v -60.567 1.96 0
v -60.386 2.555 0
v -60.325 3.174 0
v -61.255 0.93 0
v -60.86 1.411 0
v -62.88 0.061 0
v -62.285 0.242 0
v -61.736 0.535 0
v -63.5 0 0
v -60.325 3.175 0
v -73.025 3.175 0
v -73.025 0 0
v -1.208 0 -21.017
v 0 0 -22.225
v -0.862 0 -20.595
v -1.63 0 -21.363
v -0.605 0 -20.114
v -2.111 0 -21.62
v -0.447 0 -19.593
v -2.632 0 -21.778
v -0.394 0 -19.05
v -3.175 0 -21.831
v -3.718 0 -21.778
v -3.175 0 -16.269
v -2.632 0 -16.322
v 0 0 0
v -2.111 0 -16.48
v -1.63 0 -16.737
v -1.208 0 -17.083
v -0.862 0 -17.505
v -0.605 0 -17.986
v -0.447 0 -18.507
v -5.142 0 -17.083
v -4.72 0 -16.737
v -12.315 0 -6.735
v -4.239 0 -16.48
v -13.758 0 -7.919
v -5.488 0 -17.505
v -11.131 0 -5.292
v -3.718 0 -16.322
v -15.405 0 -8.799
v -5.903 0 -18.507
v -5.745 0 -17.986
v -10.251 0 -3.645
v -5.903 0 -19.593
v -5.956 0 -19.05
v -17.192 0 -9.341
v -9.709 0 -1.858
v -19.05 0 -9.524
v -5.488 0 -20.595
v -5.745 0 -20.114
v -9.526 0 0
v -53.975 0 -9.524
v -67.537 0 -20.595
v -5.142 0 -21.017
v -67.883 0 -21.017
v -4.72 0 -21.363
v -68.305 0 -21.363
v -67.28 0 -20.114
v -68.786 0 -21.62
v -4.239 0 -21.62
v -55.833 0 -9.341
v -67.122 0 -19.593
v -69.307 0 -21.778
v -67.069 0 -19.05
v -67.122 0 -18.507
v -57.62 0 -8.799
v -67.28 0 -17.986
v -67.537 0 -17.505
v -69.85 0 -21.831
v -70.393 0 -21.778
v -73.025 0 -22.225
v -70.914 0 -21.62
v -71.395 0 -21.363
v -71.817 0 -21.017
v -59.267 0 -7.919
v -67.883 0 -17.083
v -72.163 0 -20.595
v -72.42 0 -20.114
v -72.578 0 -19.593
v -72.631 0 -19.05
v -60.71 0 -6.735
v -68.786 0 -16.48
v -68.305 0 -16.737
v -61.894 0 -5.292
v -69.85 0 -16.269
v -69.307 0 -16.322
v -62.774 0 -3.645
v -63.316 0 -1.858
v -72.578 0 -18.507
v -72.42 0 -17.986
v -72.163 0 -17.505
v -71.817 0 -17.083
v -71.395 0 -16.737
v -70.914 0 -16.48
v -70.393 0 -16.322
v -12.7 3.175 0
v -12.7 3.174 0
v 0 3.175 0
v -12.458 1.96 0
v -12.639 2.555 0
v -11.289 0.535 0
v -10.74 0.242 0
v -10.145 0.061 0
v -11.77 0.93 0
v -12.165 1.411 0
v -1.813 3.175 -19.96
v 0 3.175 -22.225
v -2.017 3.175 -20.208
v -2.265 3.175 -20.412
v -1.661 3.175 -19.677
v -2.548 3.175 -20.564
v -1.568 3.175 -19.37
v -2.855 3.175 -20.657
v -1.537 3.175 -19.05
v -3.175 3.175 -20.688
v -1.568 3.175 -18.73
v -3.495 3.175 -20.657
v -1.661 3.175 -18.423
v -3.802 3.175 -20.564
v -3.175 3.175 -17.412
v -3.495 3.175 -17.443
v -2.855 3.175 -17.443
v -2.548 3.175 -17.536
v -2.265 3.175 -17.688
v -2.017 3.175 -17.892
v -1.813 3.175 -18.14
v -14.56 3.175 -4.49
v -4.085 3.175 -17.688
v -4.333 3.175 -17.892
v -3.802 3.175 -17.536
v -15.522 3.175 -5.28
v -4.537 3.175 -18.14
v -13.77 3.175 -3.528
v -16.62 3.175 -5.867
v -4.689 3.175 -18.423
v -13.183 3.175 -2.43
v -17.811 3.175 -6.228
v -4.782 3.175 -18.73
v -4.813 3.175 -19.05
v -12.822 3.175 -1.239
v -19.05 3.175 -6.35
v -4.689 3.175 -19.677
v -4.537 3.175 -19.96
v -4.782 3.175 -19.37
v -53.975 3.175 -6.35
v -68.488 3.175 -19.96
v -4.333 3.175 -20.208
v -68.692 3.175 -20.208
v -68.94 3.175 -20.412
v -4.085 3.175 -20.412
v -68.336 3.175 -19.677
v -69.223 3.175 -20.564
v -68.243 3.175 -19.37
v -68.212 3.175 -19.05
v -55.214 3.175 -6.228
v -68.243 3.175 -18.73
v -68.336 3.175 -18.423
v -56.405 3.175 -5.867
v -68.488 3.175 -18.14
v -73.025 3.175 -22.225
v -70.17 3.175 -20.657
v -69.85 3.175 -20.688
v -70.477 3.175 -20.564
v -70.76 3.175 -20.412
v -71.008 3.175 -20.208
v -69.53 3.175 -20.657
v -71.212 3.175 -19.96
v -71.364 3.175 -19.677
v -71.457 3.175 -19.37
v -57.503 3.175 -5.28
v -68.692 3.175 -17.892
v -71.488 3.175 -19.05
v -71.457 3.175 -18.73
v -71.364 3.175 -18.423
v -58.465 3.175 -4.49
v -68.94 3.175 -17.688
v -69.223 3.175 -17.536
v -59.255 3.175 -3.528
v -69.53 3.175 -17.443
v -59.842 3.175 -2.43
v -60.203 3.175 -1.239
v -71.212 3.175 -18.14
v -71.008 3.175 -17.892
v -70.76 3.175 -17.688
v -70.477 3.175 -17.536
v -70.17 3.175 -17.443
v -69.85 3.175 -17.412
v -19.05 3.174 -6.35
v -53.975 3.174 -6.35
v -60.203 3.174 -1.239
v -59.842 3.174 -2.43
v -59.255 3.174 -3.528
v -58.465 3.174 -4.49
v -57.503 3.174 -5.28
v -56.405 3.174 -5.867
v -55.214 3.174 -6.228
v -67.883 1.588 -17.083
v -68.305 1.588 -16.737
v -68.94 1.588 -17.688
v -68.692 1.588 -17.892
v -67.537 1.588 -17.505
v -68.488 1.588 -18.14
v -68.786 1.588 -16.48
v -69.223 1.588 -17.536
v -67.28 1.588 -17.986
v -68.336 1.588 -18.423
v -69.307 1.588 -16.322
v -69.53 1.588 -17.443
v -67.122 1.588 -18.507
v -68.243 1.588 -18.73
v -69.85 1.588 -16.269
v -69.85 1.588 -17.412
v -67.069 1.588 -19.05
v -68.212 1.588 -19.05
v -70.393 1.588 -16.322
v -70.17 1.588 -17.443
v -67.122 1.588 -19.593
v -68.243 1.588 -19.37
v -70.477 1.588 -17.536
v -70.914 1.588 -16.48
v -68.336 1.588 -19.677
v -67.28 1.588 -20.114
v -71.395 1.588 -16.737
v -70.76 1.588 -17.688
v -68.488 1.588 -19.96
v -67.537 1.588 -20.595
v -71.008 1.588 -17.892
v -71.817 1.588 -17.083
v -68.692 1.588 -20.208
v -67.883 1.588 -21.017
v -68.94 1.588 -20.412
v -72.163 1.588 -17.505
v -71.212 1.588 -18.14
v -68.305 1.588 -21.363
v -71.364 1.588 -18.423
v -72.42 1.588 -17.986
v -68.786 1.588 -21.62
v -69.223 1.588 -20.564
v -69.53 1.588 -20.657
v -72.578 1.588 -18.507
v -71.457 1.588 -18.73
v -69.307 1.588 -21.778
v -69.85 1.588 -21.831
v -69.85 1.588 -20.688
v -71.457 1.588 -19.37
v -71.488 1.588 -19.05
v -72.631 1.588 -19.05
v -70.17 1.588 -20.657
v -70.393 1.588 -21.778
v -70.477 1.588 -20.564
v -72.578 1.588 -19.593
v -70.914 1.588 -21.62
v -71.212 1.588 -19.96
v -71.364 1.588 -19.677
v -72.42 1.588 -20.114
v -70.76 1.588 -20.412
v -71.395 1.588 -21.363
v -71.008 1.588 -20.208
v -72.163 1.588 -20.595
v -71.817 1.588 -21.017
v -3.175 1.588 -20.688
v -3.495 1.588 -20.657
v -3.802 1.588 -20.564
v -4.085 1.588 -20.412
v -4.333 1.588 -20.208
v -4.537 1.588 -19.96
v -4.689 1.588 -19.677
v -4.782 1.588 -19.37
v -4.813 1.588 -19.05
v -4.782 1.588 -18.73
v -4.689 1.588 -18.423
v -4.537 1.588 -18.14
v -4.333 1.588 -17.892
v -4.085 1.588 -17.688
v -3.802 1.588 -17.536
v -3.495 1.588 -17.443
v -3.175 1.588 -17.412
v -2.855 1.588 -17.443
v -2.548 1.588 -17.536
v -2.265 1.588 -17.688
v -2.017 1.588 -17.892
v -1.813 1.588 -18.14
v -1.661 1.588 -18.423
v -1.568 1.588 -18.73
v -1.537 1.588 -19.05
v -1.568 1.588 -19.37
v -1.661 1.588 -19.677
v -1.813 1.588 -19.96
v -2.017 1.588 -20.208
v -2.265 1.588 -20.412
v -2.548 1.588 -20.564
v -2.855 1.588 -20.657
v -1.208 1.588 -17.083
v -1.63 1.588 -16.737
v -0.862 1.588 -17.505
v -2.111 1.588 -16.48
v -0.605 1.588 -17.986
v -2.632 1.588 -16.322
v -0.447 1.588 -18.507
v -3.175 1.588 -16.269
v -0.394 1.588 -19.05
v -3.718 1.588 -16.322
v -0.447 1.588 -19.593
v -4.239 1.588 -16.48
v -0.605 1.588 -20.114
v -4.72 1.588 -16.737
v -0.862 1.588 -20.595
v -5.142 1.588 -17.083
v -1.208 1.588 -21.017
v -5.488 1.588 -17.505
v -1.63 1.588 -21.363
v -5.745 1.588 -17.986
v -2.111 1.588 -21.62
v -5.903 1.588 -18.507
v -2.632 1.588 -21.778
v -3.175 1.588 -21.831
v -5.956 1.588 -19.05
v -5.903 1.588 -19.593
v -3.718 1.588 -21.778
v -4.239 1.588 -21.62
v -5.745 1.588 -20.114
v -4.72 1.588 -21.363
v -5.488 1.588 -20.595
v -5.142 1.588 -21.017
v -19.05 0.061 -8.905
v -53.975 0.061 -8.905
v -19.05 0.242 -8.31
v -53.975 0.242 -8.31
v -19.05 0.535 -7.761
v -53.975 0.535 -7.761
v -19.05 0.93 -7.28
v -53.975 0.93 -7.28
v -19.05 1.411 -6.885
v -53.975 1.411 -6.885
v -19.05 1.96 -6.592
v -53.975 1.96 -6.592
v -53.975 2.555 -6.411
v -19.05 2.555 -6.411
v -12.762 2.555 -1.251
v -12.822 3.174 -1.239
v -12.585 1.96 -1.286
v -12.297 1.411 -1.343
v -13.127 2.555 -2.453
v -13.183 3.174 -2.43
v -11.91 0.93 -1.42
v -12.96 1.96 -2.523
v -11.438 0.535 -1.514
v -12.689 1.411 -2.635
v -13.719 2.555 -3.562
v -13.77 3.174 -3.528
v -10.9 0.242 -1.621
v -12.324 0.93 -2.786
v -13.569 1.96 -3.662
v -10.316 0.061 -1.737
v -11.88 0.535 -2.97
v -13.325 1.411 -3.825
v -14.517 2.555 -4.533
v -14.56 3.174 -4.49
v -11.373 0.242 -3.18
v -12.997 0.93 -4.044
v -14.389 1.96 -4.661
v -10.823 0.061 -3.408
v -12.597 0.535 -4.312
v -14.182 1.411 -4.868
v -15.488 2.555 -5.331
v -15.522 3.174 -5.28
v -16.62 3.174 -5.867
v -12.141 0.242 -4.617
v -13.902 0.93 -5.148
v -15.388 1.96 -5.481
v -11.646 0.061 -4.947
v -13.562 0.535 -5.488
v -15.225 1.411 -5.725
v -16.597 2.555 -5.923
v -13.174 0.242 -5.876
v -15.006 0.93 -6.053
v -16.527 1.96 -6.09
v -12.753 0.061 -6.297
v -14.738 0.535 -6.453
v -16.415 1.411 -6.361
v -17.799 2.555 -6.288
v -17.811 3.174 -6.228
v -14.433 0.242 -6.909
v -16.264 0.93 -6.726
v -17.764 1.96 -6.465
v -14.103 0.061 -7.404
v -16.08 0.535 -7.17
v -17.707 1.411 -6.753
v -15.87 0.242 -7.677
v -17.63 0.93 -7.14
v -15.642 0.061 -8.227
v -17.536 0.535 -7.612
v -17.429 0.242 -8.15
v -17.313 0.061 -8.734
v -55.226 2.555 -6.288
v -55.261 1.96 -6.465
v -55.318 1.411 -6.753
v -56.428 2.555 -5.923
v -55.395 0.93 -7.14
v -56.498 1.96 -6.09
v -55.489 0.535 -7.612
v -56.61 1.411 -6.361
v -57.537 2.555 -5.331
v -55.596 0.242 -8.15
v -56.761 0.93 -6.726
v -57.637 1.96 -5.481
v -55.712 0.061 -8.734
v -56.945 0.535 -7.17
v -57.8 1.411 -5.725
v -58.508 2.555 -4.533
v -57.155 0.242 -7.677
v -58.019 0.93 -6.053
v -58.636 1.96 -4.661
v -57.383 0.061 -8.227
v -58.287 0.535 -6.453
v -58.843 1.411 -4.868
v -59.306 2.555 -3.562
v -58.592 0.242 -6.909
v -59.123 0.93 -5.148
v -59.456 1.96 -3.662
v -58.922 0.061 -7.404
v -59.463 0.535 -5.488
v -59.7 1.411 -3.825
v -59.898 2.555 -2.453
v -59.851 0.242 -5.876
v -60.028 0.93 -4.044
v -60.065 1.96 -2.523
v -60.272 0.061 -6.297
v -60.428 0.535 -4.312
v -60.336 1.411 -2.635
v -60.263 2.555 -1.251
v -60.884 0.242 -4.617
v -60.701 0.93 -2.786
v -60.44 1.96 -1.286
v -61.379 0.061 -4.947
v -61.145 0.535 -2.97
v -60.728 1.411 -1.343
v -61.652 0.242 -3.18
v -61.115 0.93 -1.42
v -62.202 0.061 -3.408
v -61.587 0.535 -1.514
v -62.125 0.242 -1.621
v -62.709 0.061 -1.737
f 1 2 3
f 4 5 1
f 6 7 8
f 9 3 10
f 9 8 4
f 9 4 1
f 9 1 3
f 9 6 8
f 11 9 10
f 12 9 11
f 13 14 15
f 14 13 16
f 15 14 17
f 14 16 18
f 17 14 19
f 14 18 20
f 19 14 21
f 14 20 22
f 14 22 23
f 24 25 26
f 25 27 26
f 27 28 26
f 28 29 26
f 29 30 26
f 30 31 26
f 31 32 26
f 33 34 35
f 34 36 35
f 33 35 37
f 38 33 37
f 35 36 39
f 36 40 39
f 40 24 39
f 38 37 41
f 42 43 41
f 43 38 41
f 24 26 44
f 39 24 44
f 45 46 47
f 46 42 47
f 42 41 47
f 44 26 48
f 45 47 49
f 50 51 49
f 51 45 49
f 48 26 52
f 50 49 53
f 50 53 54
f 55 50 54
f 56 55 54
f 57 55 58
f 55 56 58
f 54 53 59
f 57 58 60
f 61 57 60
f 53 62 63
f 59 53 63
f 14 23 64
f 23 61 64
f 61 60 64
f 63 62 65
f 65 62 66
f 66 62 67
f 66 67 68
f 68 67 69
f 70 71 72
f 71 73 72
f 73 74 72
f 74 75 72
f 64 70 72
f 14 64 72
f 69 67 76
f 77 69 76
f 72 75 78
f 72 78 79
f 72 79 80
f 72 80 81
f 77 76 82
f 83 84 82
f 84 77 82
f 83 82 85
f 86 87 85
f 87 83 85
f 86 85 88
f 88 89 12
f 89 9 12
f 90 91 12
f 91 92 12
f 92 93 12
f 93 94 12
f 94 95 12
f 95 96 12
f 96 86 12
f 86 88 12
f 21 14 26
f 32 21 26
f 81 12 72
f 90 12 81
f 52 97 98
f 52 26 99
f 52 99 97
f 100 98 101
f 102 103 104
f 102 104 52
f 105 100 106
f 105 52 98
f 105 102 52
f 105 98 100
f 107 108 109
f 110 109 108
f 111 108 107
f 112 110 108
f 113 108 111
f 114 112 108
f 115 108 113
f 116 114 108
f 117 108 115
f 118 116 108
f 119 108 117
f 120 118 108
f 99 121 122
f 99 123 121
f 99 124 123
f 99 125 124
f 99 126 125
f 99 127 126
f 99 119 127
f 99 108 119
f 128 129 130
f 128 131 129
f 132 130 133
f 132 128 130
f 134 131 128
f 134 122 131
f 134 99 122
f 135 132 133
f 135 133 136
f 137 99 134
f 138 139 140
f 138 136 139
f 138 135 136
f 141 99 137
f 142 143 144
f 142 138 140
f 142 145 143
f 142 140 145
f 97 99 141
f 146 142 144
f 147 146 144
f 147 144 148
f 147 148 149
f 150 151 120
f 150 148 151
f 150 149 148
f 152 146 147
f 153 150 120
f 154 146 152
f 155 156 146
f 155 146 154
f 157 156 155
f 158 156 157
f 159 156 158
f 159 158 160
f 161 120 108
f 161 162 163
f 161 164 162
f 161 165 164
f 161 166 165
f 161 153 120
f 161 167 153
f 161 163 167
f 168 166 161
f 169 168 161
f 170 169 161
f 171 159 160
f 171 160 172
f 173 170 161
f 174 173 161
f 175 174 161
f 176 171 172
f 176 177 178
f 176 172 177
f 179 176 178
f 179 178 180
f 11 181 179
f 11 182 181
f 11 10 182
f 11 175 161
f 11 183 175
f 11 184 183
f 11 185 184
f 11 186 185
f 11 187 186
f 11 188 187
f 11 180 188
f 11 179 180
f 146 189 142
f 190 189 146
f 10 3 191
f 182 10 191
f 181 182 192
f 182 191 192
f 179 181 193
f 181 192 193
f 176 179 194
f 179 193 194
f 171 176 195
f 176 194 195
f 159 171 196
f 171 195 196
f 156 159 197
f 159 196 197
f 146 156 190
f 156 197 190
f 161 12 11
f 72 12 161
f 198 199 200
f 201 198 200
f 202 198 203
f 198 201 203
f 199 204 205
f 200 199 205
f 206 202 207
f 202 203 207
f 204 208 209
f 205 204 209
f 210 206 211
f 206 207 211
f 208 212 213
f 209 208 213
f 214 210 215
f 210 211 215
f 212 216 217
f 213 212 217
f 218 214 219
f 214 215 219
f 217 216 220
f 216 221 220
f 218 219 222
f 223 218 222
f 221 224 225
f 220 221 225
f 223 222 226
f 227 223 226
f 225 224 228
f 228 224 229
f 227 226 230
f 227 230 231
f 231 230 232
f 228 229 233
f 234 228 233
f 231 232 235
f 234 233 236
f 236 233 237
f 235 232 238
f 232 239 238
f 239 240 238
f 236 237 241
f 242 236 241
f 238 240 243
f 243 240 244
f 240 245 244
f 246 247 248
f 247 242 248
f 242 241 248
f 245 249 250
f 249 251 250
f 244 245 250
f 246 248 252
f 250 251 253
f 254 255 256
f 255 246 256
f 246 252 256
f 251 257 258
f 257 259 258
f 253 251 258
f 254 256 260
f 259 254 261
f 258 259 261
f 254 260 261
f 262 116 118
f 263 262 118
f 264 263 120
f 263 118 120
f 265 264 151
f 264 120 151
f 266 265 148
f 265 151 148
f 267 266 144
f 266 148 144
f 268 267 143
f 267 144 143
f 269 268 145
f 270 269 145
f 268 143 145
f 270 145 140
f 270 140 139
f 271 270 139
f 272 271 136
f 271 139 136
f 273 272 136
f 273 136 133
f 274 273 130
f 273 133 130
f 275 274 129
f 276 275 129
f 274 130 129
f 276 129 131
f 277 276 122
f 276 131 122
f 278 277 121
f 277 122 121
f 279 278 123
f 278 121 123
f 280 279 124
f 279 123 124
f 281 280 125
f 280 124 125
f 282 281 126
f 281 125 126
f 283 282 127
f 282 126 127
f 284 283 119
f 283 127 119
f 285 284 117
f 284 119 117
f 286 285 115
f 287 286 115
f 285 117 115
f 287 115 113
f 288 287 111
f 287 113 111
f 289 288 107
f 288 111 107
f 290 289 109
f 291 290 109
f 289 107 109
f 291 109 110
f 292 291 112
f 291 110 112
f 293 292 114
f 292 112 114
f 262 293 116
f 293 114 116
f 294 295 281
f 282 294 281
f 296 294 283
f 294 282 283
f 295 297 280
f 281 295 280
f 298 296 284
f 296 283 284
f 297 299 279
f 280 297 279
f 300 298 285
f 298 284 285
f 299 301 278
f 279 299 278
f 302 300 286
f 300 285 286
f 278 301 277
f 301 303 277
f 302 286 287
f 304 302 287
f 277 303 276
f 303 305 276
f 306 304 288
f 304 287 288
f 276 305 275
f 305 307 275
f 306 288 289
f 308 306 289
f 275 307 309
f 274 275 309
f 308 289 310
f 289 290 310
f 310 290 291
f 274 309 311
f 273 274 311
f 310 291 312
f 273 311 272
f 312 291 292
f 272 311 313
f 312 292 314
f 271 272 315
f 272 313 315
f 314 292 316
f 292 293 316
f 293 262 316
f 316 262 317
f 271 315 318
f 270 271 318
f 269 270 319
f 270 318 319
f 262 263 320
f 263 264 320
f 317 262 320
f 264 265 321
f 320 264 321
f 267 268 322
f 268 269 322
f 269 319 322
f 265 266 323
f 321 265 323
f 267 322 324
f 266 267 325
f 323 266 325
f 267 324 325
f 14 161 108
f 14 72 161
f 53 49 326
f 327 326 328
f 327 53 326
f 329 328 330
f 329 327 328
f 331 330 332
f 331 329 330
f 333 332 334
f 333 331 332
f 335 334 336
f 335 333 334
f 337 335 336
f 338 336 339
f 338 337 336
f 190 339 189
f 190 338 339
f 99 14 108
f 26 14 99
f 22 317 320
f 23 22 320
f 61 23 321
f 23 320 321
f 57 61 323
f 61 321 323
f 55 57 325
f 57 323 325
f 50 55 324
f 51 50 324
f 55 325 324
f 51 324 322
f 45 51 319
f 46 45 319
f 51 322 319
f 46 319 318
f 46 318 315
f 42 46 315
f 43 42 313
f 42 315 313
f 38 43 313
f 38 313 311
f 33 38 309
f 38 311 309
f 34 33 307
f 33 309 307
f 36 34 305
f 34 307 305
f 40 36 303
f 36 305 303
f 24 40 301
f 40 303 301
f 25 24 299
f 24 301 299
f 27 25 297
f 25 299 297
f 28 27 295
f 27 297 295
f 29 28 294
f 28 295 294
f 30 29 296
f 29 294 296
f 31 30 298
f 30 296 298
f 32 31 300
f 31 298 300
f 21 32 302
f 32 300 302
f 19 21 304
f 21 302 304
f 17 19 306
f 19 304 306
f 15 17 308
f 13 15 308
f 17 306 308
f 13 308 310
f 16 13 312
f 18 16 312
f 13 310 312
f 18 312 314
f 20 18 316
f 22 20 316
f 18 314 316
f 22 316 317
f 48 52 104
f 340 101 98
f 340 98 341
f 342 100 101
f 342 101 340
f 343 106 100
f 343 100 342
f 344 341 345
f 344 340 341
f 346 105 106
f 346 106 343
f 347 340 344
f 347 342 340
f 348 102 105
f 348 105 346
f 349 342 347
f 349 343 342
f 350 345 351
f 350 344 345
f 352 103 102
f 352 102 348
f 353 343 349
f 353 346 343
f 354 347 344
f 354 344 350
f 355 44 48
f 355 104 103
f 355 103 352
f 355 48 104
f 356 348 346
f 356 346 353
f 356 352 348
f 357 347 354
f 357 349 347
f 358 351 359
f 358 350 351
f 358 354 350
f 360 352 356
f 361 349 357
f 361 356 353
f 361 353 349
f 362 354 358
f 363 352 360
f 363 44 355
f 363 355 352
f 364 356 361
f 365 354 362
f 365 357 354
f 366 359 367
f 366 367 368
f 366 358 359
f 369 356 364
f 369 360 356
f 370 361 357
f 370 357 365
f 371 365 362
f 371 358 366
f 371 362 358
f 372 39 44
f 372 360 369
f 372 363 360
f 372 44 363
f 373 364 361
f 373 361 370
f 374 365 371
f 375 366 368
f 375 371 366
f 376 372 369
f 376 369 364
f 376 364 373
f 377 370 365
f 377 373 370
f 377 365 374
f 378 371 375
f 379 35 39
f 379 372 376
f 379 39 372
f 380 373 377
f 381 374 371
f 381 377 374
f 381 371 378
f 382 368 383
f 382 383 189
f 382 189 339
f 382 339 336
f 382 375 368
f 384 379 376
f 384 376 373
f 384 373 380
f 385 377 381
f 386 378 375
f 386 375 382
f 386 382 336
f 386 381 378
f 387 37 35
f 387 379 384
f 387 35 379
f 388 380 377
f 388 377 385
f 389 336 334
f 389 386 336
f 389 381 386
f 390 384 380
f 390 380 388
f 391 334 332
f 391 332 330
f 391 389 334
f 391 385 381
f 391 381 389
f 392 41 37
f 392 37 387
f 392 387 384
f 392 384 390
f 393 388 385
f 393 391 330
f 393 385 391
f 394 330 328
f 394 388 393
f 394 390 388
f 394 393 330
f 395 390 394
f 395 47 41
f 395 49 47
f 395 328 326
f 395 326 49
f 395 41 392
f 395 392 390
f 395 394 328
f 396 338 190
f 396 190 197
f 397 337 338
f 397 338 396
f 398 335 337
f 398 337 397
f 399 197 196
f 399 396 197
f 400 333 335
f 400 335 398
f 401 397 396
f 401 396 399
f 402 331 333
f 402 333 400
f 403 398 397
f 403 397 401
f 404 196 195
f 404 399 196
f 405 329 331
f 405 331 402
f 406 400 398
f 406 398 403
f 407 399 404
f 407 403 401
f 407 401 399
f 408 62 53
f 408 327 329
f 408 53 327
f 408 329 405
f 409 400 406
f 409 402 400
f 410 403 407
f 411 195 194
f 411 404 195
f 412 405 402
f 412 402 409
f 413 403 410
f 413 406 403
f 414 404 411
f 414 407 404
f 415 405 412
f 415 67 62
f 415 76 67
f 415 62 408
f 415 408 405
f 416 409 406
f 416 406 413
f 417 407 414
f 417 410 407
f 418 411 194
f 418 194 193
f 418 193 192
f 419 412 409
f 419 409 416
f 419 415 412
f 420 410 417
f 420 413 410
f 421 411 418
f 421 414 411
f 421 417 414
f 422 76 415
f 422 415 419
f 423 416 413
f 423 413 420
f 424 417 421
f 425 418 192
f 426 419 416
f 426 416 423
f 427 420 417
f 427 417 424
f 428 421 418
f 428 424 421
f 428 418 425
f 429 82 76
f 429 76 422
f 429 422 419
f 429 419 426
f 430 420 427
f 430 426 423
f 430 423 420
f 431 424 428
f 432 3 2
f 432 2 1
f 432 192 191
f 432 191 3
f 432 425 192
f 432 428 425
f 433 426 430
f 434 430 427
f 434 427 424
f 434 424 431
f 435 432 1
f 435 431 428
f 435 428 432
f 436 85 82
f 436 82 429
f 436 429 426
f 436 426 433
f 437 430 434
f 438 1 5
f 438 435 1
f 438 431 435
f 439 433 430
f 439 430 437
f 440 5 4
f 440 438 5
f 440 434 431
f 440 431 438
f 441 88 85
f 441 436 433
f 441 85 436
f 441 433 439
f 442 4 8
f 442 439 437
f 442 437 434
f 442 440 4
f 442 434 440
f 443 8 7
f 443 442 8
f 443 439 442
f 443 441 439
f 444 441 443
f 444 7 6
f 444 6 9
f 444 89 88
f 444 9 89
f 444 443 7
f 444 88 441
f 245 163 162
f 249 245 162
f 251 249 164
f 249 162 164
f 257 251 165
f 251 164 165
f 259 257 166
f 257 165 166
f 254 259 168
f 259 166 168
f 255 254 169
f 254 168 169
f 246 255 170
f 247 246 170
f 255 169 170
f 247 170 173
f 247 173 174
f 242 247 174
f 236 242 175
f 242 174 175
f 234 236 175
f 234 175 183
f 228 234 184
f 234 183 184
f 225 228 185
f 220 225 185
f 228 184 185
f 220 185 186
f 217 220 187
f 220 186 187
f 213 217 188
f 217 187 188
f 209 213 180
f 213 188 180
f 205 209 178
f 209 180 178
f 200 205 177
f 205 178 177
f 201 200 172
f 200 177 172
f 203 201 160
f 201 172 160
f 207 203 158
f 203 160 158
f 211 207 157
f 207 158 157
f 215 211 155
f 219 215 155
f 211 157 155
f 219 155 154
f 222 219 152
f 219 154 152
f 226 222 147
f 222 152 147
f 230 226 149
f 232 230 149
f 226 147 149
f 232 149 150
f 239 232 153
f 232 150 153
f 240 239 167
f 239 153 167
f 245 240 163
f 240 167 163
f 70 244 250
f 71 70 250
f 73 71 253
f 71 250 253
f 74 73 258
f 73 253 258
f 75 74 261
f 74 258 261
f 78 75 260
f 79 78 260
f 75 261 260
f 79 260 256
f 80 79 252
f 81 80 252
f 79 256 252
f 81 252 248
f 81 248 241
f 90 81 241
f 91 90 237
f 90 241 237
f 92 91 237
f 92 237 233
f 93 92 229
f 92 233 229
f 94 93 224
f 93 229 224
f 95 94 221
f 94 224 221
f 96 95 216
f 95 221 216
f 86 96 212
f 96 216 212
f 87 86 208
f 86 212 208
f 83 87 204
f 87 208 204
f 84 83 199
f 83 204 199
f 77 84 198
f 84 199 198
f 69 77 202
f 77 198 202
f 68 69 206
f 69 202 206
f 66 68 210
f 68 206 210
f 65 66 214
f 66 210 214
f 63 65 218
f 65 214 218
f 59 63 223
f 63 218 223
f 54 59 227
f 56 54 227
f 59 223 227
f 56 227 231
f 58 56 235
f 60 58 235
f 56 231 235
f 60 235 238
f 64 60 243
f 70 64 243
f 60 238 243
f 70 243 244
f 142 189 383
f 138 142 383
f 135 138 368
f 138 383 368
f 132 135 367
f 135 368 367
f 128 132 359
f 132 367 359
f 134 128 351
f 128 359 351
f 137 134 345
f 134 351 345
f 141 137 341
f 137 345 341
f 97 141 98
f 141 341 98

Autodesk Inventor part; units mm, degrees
ref_plane "YZ Plane" through (0, 0, 0) normal (1, 0, 0) x (0, 1, 0)
ref_plane "XZ Plane" through (0, 0, 0) normal (0, 1, 0) x (-1, 0, 0)
ref_plane "XY Plane" through (0, 0, 0) normal (0, 0, 1) x (1, 0, 0)
sketch "Sketch1" plane through (0, 0, 0) normal (0, 1, 0) x (-1, 0, 0)
  line L0 (0, 0) -> (73.025, 0)
  line L1 (73.025, 0) -> (73.025, -22.225)
  line L2 (73.025, -22.225) -> (0, -22.225)
  line L3 (0, -22.225) -> (0, 0)
  line L4 (73.025, 0) -> (53.975, 0)
  line L5 (0, 0) -> (19.05, 0)
  line L6 (53.975, 0) -> (19.05, 0) construction
  line L7 (53.975, 6.35) -> (19.05, 6.35)
  line L8 (19.05, -6.35) -> (53.975, -6.35)
  arc A0 (53.975, -6.35) -> (53.975, 6.35) centre (53.975, 0) ccw
  arc A1 (19.05, 6.35) -> (19.05, -6.35) centre (19.05, 0) ccw
  line L9 (73.025, -22.225) -> (69.85, -22.225)
  line L10 (69.85, -22.225) -> (69.85, -19.05)
  line L11 (69.85, -19.05) -> (73.025, -19.05)
  line L12 (73.025, -19.05) -> (73.025, -22.225)
  line L13 (0, -22.225) -> (3.175, -22.225)
  line L14 (3.175, -22.225) -> (3.175, -19.05)
  line L15 (3.175, -19.05) -> (0, -19.05)
  line L16 (0, -19.05) -> (0, -22.225)
  point P0 (36.5125, 0)
  point P1 (60.325, 0)
  point P2 (12.7, 0)
  dimension "d0" = 73.025
  dimension "d1" = 22.225
  dimension "d2" = 19.05
  dimension "d3" = 19.05
  dimension "d4" = 12.7
  dimension "d7" = 3.175
  dimension "d8" = 3.175
  dimension "d9" = 3.175
  dimension "d10" = 3.175
extrude "Extrusion1" add sketch "Sketch1" along normal blind 3.175 contours A1 L8 A0 L0 L1 L11 L10 L2 L14 L15 L3 | L15 L14 L2 L3 | L1 L2 L10 L11
hole "Hole1" at (-69.85, 0, -19.05) at (-3.175, 0, -19.05) direction (0, 1, 0) diameter 3.2766 end through all counterbore diameter 5.5626 counterbore depth 1.5875 clearance for "Socket Head Cap Screw" size "#4" standard "Ansi Unified Screw Threads"
fillet "Fillet2" radius 3.175 3 edges at (-14.5599, 0, -4.4901) (-58.4651, 0, -4.4901) (-36.5125, 0, -6.35)
properties part number "Compute Module Top Cover for RoadBot Rail-r1"
